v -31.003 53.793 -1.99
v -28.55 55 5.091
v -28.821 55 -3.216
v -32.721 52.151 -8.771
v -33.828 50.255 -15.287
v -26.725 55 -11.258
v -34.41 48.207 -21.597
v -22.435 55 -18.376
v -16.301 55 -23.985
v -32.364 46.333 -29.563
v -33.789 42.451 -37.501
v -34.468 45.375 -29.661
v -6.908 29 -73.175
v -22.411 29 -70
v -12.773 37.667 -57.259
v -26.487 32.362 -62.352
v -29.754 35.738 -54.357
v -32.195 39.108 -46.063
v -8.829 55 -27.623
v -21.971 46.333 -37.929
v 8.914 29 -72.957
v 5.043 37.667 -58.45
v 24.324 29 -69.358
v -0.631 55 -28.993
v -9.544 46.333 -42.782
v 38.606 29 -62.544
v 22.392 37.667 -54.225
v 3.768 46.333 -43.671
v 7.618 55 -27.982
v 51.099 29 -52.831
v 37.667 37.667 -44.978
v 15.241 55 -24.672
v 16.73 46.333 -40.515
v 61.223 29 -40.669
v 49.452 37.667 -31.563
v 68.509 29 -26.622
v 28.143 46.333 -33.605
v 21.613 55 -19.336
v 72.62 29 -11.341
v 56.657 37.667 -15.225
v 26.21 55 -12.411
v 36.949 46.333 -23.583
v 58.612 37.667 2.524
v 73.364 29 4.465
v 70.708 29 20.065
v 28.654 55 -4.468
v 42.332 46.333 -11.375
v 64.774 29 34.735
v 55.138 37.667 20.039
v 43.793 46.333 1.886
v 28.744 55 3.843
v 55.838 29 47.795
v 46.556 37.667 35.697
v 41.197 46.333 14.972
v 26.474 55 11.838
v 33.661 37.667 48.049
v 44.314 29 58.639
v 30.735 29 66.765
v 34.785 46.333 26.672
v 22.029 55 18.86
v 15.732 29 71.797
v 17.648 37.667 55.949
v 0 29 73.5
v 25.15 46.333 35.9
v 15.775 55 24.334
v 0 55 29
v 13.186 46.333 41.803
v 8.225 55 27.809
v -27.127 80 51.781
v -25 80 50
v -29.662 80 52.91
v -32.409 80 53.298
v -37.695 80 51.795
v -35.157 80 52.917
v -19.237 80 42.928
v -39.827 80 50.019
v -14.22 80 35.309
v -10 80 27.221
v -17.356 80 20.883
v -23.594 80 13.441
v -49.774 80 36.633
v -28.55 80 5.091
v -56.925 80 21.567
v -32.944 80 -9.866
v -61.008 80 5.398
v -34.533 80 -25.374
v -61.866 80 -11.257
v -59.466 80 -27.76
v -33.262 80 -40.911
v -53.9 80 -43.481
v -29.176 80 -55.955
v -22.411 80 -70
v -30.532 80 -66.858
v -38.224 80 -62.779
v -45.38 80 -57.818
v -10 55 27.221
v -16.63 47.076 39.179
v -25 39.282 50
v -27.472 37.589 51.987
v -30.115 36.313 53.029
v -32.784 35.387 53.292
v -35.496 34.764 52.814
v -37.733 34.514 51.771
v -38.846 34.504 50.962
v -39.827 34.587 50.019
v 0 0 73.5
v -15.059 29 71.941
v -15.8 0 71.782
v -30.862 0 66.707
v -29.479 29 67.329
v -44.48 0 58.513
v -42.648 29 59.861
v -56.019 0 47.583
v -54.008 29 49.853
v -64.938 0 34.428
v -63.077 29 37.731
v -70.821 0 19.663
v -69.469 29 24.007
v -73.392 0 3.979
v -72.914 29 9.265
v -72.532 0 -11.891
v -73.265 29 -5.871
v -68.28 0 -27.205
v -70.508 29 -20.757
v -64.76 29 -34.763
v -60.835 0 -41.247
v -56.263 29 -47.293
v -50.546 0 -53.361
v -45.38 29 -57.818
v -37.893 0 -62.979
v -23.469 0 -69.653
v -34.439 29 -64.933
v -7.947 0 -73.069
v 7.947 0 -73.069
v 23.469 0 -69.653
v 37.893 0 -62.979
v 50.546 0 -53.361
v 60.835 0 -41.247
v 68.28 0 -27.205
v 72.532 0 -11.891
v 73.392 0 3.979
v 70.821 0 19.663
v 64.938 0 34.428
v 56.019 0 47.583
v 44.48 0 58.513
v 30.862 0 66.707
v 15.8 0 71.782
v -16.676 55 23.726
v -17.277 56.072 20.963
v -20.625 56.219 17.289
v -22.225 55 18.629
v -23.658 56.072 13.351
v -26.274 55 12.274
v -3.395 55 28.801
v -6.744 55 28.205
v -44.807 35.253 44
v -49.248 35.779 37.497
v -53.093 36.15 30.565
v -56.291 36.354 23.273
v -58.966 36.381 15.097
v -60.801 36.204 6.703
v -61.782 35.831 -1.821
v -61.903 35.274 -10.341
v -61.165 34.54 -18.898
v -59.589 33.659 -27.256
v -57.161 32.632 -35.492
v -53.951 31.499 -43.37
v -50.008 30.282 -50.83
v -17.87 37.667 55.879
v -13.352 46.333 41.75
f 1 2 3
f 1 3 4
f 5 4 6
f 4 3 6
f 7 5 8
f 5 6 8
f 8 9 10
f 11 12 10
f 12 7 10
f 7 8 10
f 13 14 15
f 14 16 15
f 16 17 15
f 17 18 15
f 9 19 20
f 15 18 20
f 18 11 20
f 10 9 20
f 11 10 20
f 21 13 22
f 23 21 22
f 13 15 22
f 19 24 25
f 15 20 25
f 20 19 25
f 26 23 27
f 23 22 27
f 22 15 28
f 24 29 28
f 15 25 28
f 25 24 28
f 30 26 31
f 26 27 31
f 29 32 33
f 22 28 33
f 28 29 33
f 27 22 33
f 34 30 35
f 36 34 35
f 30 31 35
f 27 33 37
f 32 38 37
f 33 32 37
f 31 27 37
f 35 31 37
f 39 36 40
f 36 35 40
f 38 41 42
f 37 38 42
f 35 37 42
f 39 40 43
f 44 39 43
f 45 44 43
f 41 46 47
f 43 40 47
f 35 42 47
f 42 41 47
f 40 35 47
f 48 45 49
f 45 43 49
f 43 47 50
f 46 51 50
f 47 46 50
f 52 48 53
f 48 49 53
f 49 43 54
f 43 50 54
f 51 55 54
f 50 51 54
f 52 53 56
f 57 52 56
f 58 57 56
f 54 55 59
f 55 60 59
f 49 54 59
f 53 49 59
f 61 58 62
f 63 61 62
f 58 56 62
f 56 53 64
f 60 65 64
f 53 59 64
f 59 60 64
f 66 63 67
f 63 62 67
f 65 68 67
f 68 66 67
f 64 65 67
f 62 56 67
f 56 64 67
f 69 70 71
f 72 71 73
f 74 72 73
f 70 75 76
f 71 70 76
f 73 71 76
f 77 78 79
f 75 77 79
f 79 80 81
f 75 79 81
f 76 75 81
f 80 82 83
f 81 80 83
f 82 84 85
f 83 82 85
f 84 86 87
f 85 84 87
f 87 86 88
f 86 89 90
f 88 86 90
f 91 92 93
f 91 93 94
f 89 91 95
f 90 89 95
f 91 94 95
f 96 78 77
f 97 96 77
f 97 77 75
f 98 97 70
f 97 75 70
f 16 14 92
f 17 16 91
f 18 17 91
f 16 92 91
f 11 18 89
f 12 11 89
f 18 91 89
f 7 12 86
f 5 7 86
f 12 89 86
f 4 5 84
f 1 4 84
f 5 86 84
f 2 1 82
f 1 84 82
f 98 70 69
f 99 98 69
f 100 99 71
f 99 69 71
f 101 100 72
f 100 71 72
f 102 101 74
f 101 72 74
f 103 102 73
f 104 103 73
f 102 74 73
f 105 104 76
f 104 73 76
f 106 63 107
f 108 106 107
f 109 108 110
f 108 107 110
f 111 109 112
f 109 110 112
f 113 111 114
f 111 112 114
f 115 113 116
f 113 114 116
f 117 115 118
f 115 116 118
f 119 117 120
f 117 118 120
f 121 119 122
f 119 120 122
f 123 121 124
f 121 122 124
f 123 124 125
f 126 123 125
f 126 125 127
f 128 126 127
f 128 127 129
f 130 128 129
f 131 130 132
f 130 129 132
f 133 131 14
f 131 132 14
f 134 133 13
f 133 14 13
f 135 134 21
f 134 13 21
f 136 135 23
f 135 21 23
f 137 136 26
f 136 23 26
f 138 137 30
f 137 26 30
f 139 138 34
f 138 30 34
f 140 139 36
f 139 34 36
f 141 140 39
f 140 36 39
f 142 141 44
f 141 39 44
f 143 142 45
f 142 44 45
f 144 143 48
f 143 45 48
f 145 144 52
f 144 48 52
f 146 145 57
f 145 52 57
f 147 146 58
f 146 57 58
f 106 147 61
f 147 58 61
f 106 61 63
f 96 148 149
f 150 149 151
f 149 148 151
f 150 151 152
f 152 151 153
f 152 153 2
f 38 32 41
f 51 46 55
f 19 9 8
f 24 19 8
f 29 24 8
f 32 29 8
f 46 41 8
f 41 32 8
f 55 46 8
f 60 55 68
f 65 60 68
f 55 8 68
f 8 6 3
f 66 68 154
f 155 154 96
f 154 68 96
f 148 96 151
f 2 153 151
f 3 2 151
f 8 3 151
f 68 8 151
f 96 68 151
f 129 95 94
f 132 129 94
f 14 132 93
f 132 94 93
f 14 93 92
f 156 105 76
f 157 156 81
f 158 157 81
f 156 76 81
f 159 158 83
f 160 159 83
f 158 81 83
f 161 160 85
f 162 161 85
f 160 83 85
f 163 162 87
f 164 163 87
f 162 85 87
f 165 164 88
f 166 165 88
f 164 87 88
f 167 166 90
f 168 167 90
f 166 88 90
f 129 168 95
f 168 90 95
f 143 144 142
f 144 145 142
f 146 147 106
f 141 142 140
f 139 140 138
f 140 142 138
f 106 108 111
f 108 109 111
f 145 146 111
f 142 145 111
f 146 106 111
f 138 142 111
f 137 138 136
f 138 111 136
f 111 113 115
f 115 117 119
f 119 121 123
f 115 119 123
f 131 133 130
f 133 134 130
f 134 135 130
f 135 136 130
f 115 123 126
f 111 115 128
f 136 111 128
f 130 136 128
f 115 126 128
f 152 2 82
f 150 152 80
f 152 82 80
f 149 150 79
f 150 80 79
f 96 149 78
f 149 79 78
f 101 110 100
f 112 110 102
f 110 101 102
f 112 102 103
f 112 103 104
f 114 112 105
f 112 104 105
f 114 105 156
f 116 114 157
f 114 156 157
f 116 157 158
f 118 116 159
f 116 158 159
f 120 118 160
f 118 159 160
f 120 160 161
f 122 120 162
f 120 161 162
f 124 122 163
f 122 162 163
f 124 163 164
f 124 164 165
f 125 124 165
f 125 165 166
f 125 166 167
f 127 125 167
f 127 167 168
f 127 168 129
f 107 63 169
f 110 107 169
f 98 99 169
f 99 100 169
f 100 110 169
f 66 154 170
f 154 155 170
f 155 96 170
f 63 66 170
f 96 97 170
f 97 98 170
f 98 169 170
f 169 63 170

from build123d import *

# Parameters (mm, degrees)
EXTRUDE_1_REACH = 133.166


with BuildPart() as part:
    # Эскиз1 → Повернуть1 (revolve)
    with BuildSketch(Plane.XY, mode=Mode.PRIVATE) as revolve_1_sk:
        Polygon((0, 0), (-73.5, 0), (-73.5, 29), (-29, 55), (0, 55), align=None)
    revolve(revolve_1_sk.sketch.rotate(Axis((0, 0, 0), (0, -1, 0)), 270), axis=Axis((0, 0, 0), (0, -1, 0)))

    # Бобышка-Вытянуть1: up to this cone (the profile starts outside it)
    extrude_1_end = Plane(origin=(0, 80, 0), z_dir=(0, -1, 0)).offset(8.056180775) * Cone(1.712e-06, 214.986038462, 125.609819225, align=(Align.CENTER, Align.CENTER, Align.MIN), mode=Mode.PRIVATE)
    # Эскиз2 → Бобышка-Вытянуть1 (add, up to the surface)
    with BuildSketch(Plane(origin=(0, 80, 0), x_dir=(-1, 0, 0), z_dir=(0, -1, 0)), mode=Mode.PRIVATE) as extrude_1_sk1:
        with BuildLine():
            ThreePointArc((39.826891471, -50.018998092), (61.845069439, 2.908427791), (45.380271287, 57.817652822))
            ThreePointArc((45.380271287, 57.817652822), (34.438558368, 64.93254729), (22.410934831, 70))
            ThreePointArc((22.410934831, 70), (34.25441727, 33.17194105), (28.549688681, -5.090704886))
            ThreePointArc((28.549688681, -5.090704886), (20.626062909, -17.288589905), (10, -27.221315178))
            ThreePointArc((10, -27.221315178), (16.632121962, -39.182164271), (25, -50))
            ThreePointArc((25, -50), (32.409231762, -53.29825711), (39.826891471, -50.018998092))
        make_face()
    extrude_1_tool1 = extrude(extrude_1_sk1.sketch, amount=EXTRUDE_1_REACH, mode=Mode.PRIVATE) - extrude_1_end
    add(extrude_1_tool1.solids().sort_by_distance((-40.446865, 80, -0.64775))[0])


solid = part.part
